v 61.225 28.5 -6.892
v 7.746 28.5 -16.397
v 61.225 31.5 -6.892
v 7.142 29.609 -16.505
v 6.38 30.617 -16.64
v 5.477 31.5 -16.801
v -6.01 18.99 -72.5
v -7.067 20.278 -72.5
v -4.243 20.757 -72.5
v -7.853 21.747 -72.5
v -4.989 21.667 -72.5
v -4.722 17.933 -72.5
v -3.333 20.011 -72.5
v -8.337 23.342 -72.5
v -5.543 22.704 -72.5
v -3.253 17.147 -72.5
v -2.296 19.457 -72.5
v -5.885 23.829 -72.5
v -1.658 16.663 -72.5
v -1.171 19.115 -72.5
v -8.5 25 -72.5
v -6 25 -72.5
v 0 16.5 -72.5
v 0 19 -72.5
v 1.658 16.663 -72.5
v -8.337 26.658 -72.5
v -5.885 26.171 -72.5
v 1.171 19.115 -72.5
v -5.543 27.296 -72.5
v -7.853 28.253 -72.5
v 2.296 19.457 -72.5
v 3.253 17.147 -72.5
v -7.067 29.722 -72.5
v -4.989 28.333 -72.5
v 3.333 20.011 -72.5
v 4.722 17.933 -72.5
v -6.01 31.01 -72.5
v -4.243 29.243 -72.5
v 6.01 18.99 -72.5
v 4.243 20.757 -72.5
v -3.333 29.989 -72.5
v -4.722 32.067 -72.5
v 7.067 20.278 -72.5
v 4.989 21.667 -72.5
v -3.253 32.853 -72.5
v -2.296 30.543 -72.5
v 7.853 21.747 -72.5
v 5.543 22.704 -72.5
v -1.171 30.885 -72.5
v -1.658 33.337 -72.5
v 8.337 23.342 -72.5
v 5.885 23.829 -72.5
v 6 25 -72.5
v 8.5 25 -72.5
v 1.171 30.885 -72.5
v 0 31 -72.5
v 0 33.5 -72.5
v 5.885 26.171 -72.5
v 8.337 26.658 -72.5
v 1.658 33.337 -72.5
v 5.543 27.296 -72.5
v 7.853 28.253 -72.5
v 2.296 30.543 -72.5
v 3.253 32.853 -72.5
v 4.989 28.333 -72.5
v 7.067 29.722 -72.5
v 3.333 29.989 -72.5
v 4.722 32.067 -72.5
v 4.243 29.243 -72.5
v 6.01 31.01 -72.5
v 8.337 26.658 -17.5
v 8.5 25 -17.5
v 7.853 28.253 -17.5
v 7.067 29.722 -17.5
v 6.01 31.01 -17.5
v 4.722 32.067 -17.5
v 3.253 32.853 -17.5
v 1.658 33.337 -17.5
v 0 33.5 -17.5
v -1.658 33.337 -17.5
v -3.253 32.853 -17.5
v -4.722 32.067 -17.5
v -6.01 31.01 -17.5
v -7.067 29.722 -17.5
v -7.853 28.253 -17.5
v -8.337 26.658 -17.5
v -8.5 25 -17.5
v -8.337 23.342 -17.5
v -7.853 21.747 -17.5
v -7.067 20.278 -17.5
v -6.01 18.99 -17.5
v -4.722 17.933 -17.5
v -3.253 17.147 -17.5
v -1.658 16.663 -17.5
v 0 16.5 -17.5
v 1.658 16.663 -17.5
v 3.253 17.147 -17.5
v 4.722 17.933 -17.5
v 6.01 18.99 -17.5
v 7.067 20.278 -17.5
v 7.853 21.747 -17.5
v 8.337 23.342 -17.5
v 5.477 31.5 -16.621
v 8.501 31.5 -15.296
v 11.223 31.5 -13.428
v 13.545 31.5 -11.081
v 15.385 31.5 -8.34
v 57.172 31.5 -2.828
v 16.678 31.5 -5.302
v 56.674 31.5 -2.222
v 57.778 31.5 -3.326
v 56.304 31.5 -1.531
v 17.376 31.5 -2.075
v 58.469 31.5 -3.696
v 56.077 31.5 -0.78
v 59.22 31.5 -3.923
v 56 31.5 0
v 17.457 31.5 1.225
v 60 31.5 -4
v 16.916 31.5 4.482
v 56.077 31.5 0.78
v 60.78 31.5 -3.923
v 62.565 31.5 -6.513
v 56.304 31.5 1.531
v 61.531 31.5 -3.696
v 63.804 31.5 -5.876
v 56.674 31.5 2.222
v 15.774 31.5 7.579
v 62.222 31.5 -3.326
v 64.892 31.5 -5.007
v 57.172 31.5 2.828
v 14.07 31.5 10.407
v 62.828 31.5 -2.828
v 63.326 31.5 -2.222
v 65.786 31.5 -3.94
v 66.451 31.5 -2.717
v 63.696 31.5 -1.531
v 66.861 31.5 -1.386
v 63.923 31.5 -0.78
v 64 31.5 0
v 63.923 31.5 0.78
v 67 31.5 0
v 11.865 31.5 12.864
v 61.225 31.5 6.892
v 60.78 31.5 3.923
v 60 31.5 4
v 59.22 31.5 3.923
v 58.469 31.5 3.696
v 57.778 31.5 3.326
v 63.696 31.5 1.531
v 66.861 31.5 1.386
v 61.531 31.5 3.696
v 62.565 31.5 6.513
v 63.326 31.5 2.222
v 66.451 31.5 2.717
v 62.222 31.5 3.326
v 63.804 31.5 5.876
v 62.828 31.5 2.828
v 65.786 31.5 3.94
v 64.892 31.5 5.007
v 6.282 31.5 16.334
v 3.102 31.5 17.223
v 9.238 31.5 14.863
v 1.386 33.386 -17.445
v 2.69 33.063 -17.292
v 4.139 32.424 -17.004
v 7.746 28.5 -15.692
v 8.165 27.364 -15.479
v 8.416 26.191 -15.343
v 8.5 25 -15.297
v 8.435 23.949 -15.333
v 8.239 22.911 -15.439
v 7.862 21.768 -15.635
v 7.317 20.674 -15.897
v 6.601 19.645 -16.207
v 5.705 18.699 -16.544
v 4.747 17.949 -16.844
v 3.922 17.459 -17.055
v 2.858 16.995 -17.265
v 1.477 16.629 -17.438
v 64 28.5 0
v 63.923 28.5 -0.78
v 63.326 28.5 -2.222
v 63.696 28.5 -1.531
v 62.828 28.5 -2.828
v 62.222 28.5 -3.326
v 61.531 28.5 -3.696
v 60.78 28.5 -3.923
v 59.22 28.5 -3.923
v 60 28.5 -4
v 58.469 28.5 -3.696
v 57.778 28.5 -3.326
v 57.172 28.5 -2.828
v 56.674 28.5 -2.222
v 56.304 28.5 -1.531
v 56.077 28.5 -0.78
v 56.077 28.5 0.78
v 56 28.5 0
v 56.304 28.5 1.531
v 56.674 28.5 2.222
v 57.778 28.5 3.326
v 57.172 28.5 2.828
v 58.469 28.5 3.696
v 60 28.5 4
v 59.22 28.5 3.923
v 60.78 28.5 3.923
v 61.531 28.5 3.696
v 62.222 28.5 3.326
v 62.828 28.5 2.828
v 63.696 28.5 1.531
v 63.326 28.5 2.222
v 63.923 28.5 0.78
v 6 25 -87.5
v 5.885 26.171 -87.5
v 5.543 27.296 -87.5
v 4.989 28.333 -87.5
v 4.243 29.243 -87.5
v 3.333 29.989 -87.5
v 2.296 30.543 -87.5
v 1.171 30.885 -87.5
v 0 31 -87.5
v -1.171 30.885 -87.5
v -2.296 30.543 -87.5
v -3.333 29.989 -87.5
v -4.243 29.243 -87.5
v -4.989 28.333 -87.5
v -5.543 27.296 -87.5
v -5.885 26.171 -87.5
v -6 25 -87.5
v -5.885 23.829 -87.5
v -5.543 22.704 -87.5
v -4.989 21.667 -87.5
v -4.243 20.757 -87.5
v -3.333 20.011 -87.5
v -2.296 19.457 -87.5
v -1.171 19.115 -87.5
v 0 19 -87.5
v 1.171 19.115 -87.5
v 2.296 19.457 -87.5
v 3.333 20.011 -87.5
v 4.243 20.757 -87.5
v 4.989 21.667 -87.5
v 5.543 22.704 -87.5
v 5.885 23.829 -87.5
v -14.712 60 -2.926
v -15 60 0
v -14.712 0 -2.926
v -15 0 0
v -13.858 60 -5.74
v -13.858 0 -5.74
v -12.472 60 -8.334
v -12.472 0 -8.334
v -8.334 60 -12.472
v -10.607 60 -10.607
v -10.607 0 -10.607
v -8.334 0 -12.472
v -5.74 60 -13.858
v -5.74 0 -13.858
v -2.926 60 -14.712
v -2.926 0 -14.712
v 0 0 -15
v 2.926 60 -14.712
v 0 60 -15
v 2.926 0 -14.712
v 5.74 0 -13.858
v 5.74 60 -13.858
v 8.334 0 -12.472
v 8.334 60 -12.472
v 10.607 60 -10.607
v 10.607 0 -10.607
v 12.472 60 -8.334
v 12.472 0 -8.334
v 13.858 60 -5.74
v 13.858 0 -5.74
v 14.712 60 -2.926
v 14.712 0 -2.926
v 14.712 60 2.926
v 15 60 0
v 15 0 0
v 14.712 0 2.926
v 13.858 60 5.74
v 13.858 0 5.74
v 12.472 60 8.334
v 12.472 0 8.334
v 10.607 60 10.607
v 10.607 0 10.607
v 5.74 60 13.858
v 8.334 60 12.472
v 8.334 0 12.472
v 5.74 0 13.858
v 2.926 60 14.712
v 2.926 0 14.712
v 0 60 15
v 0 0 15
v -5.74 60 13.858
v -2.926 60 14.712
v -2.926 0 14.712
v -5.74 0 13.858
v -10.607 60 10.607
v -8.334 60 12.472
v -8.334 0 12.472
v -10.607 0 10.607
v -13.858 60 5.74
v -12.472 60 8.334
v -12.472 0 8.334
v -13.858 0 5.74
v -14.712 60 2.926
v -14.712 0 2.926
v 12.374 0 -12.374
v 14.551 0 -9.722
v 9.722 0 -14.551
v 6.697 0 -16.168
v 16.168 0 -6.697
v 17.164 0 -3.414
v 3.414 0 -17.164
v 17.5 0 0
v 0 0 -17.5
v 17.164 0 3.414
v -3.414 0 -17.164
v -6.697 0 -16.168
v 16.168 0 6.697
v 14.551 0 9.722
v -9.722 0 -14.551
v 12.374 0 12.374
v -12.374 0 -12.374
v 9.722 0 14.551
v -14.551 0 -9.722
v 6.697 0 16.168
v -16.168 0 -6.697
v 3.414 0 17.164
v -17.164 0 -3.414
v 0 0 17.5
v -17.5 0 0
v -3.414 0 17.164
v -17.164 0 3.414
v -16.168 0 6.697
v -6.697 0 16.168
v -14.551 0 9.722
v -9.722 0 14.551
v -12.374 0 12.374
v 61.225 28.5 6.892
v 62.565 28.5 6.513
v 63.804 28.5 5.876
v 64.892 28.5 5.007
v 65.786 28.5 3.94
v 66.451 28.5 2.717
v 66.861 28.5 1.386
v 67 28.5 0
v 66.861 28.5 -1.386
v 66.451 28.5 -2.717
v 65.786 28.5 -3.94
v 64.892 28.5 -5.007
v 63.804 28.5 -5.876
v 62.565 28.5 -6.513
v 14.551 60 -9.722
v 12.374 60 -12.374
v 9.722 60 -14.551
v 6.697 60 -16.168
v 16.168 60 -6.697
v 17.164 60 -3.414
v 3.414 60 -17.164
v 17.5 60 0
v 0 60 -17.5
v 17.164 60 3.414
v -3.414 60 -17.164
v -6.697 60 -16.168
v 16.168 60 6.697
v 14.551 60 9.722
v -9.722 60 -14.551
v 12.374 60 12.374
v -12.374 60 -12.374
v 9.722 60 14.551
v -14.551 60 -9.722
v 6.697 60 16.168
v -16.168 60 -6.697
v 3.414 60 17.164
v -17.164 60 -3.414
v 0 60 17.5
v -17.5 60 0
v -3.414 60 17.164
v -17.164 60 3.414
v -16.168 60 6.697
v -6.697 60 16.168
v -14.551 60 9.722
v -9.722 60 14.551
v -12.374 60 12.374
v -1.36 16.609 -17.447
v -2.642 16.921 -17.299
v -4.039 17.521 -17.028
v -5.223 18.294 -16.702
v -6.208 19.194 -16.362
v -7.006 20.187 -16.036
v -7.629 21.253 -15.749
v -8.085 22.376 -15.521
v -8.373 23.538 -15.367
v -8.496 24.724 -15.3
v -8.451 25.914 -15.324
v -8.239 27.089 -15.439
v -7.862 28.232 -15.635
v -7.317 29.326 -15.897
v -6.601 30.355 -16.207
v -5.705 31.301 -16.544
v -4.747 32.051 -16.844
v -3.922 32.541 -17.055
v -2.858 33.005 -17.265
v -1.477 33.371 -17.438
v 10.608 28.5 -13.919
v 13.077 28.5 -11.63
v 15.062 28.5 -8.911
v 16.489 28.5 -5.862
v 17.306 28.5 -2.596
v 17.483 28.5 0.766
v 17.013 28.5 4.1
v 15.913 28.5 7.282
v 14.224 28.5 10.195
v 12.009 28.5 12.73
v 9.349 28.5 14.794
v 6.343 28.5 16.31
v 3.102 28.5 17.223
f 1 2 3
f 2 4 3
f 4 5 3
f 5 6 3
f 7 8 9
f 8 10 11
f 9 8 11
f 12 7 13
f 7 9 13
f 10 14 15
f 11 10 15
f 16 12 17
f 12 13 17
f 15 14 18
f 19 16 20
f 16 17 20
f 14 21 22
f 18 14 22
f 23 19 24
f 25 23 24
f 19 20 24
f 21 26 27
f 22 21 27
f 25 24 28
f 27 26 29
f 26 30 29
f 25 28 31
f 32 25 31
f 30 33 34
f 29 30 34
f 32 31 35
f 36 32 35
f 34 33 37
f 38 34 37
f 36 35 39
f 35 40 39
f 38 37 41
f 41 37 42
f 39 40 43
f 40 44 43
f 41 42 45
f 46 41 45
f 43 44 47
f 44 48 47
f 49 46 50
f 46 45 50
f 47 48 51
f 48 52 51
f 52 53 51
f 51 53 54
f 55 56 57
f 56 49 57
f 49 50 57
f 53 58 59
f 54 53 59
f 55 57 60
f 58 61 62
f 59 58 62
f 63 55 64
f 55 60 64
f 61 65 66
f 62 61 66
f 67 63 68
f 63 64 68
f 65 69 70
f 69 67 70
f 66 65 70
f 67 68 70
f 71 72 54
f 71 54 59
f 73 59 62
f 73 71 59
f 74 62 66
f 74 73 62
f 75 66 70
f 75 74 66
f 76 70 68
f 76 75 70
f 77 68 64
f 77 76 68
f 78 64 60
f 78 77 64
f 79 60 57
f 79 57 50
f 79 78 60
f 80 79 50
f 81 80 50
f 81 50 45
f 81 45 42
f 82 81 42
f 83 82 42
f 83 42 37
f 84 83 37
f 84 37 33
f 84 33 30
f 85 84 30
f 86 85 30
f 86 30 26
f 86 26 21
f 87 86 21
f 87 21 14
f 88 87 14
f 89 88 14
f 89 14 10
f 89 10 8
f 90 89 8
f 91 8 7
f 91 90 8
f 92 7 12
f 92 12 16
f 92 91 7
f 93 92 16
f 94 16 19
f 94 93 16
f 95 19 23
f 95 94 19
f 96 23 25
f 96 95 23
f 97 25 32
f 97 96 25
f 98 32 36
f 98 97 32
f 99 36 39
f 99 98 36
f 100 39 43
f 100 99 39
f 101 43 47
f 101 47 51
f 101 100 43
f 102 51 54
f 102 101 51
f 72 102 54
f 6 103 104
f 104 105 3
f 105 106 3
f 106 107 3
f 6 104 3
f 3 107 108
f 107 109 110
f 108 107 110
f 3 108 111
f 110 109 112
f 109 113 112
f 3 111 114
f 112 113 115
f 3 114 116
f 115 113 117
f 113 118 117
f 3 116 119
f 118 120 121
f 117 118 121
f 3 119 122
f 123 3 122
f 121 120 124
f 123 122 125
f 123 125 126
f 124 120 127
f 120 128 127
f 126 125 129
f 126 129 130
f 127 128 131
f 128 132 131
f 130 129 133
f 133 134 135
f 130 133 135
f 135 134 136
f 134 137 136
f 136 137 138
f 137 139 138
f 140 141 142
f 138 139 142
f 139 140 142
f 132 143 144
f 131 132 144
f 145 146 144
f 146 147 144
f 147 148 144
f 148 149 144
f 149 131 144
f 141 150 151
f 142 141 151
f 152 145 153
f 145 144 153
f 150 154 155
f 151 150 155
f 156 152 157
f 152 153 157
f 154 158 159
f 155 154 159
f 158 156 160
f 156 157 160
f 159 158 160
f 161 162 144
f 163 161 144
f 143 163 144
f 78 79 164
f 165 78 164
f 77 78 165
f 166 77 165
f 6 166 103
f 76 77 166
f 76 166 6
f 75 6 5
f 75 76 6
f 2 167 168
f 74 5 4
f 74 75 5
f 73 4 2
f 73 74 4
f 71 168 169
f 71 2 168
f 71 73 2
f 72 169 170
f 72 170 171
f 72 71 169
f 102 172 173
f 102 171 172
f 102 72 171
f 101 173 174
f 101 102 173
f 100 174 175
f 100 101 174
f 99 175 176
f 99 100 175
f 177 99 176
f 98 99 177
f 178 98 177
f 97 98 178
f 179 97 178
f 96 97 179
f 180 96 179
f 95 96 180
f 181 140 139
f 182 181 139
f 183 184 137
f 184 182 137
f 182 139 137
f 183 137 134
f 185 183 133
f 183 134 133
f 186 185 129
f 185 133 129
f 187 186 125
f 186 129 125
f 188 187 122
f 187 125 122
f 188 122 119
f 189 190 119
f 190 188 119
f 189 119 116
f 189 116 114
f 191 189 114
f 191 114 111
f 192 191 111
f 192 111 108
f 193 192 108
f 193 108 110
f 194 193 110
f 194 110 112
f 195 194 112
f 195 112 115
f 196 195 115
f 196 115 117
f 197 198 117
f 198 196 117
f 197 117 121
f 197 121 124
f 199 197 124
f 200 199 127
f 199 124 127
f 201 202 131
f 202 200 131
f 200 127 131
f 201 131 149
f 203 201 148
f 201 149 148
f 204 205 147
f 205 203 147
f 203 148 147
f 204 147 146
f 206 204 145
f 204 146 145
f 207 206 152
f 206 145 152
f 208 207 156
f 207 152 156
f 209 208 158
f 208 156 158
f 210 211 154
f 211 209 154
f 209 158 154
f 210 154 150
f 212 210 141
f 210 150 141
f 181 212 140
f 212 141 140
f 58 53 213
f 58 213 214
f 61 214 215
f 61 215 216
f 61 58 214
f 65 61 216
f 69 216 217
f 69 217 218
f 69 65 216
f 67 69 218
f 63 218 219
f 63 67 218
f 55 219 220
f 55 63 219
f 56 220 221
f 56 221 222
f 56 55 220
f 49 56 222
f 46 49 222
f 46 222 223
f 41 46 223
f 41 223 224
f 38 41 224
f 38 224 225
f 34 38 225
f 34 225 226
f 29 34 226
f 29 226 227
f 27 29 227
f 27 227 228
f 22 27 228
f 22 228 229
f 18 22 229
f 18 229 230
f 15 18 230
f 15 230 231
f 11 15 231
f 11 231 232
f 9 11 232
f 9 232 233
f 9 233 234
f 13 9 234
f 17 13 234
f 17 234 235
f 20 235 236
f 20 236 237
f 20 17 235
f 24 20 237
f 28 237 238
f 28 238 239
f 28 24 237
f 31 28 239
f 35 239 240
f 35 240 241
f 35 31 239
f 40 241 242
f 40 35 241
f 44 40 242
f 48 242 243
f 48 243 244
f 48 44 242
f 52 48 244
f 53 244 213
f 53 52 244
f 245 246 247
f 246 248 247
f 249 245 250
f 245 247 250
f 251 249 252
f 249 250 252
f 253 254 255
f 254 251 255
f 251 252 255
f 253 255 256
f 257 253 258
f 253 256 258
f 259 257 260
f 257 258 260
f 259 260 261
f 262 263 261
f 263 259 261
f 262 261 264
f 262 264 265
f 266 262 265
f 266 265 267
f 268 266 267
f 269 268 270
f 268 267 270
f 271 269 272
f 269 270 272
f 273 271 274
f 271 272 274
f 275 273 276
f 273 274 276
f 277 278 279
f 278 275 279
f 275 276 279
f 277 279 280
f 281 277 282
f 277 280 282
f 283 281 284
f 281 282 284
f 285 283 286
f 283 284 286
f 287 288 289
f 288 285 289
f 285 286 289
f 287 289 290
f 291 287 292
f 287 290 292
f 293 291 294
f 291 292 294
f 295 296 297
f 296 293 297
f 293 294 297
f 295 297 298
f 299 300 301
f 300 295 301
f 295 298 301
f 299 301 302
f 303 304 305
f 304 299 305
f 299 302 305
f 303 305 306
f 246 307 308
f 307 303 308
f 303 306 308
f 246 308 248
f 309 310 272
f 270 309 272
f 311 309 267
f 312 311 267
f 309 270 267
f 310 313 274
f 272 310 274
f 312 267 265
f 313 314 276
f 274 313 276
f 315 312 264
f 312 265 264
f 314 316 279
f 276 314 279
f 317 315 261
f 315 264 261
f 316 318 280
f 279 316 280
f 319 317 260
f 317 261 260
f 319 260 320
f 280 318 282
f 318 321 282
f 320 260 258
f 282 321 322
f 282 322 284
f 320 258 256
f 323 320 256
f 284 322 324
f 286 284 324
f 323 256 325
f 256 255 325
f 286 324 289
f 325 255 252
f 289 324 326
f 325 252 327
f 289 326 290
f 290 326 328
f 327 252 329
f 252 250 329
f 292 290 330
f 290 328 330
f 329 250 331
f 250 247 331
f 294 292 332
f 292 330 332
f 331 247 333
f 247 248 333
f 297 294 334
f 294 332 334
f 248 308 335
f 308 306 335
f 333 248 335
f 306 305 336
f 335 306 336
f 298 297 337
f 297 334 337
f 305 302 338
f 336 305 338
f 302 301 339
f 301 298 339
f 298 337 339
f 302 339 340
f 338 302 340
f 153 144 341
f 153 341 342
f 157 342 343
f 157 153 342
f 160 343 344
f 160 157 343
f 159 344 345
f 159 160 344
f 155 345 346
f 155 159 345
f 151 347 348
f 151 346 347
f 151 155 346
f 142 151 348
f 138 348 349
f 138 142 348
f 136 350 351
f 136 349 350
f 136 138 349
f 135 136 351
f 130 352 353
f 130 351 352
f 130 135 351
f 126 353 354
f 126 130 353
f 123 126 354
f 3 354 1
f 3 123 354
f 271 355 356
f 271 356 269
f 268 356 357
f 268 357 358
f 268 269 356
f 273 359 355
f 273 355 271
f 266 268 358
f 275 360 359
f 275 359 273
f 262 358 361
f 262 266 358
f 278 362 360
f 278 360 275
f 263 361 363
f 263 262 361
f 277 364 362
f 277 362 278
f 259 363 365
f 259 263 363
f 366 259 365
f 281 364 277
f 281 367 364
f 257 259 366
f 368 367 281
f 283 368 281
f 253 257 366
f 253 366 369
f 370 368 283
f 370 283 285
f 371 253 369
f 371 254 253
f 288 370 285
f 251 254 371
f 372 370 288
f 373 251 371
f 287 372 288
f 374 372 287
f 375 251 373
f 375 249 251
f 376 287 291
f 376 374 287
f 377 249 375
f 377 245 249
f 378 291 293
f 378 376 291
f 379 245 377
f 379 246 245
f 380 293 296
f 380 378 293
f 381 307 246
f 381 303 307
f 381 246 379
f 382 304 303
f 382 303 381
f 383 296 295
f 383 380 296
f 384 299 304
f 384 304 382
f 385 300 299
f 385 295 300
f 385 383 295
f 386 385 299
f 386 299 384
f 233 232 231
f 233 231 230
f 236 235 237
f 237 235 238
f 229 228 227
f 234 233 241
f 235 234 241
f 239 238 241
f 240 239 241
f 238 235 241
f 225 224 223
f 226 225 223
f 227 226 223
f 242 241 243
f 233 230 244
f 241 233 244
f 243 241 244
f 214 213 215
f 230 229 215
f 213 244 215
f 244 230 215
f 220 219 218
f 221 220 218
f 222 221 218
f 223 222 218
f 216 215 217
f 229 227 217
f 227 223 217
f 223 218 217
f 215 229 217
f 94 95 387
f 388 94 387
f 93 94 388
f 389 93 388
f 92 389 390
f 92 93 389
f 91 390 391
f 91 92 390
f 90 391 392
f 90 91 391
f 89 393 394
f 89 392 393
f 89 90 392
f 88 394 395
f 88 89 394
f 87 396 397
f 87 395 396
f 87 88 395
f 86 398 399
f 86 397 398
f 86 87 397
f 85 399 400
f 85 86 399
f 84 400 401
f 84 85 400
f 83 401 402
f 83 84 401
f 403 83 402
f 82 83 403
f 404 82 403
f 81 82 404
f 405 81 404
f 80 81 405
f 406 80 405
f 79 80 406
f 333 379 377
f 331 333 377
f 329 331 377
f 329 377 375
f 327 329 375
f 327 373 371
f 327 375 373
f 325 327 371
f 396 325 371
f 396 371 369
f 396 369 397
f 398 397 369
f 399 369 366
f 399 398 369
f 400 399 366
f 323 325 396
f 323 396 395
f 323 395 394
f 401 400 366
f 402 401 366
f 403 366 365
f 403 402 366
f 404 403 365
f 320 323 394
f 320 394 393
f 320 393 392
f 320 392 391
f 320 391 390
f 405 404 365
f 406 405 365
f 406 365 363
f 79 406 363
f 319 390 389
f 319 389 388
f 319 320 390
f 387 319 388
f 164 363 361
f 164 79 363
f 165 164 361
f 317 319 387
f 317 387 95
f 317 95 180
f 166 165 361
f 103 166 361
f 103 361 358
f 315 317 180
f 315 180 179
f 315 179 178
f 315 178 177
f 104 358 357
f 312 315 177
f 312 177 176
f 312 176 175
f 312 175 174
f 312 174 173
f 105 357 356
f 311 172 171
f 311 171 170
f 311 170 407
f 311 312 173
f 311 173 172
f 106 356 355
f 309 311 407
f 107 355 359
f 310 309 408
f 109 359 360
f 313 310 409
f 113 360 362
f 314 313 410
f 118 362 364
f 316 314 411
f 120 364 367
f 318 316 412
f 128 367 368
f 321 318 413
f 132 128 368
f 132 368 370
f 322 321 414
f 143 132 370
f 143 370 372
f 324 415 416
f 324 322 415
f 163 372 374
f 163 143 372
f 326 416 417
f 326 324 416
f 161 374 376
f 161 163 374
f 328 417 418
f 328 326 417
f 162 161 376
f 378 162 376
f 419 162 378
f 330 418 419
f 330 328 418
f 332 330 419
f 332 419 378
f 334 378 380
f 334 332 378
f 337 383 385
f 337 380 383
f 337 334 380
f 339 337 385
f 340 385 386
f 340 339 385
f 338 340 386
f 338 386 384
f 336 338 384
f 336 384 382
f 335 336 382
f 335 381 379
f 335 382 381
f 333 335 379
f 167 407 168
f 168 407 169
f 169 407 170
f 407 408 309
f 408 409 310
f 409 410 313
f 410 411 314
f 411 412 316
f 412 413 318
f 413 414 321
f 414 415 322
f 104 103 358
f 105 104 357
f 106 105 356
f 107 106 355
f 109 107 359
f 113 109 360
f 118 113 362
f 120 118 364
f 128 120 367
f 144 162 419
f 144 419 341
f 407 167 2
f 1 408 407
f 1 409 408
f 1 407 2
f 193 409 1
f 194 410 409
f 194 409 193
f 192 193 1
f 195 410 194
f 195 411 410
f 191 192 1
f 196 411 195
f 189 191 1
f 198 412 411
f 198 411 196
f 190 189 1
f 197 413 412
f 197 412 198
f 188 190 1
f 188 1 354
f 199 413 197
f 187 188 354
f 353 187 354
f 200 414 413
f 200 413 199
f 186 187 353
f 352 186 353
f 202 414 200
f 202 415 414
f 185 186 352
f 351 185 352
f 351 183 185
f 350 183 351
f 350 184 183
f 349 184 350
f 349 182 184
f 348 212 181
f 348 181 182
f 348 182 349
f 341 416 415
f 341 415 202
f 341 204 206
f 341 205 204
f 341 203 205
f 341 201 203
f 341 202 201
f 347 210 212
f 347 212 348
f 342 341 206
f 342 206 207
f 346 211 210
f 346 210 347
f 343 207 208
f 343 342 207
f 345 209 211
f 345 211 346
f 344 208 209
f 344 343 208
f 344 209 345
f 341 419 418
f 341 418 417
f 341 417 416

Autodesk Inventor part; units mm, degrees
sketch "Sketch1" plane through (0, 0, 0) normal (0, 1, 0) x (-1, 0, 0)
  line L0 (0, -24.5) -> (0, 24.5) construction
  line L1 (-24.5, 0) -> (24.5, 0) construction
  circle A0 centre (0, 0) radius 17.5
  circle A1 centre (0, 0) radius 15
  dimension "d0" = 35
  dimension "d1" = 30
extrude "Extrusion1" add sketch "Sketch1" along normal blind 60
ref_plane "Work Plane5" through (17.5, 0, 0) normal (1, 0, 0) x (0, 1, 0)
ref_plane "Work Plane6" through (0, 30, 0) normal (0, -1, 0) x (1, 0, 0)
sketch "Sketch7" plane through (0, 30, 0) normal (0, -1, 0) x (1, 0, 0)
  circle A0 centre (0, 0) radius 15 construction
  line L0 (0, 24.5) -> (0, -24.5) construction
  line L1 (-34.4, 0) -> (83.9, 0) construction
  arc A1 (61.225, -6.892) -> (61.225, 6.892) centre (60, 0) ccw
  line L2 (3.0625, -17.2299) -> (61.225, -6.892)
  line L3 (3.0625, 17.2299) -> (61.225, 6.892)
  arc A2 (3.0625, -17.2299) -> (3.0625, 17.2299) centre (0, 0) ccw
  circle A3 centre (60, 0) radius 4
  dimension "d35" = 14
  dimension "d36" = 60
  dimension "d37" = 8
extrude "Extrusion5" add sketch "Sketch7" along normal mid plane 3
ref_plane "Work Plane7" through (0, 0, -17.5) normal (0, 0, 1) x (1, 0, 0)
sketch "Sketch8" plane through (0, 0, -17.5) normal (0, 0, 1) x (1, 0, 0)
  circle A0 centre (0, 25) radius 6 projected
  circle A1 centre (0, 25) radius 8.5 projected
  point P0 (0, 0)
extrude "Extrusion6" add sketch "Sketch8" against normal blind 55 contours A0 | A1
extrude "Extrusion7" add sketch "Sketch8" against normal blind 70 contours A0
extrude "Extrusion8" add sketch "Sketch8" along normal up to next contours A0 | A1
thread "Thread2" size "M12x1.75" class "6g" standard "ANSI Metric M Profile" full length
equation "\"d23\" = 55deg"
equation "\"Sketch4_Pitch\" = 1.75"
properties part number "steering_kingpin_right" material "Steel, Mild"
